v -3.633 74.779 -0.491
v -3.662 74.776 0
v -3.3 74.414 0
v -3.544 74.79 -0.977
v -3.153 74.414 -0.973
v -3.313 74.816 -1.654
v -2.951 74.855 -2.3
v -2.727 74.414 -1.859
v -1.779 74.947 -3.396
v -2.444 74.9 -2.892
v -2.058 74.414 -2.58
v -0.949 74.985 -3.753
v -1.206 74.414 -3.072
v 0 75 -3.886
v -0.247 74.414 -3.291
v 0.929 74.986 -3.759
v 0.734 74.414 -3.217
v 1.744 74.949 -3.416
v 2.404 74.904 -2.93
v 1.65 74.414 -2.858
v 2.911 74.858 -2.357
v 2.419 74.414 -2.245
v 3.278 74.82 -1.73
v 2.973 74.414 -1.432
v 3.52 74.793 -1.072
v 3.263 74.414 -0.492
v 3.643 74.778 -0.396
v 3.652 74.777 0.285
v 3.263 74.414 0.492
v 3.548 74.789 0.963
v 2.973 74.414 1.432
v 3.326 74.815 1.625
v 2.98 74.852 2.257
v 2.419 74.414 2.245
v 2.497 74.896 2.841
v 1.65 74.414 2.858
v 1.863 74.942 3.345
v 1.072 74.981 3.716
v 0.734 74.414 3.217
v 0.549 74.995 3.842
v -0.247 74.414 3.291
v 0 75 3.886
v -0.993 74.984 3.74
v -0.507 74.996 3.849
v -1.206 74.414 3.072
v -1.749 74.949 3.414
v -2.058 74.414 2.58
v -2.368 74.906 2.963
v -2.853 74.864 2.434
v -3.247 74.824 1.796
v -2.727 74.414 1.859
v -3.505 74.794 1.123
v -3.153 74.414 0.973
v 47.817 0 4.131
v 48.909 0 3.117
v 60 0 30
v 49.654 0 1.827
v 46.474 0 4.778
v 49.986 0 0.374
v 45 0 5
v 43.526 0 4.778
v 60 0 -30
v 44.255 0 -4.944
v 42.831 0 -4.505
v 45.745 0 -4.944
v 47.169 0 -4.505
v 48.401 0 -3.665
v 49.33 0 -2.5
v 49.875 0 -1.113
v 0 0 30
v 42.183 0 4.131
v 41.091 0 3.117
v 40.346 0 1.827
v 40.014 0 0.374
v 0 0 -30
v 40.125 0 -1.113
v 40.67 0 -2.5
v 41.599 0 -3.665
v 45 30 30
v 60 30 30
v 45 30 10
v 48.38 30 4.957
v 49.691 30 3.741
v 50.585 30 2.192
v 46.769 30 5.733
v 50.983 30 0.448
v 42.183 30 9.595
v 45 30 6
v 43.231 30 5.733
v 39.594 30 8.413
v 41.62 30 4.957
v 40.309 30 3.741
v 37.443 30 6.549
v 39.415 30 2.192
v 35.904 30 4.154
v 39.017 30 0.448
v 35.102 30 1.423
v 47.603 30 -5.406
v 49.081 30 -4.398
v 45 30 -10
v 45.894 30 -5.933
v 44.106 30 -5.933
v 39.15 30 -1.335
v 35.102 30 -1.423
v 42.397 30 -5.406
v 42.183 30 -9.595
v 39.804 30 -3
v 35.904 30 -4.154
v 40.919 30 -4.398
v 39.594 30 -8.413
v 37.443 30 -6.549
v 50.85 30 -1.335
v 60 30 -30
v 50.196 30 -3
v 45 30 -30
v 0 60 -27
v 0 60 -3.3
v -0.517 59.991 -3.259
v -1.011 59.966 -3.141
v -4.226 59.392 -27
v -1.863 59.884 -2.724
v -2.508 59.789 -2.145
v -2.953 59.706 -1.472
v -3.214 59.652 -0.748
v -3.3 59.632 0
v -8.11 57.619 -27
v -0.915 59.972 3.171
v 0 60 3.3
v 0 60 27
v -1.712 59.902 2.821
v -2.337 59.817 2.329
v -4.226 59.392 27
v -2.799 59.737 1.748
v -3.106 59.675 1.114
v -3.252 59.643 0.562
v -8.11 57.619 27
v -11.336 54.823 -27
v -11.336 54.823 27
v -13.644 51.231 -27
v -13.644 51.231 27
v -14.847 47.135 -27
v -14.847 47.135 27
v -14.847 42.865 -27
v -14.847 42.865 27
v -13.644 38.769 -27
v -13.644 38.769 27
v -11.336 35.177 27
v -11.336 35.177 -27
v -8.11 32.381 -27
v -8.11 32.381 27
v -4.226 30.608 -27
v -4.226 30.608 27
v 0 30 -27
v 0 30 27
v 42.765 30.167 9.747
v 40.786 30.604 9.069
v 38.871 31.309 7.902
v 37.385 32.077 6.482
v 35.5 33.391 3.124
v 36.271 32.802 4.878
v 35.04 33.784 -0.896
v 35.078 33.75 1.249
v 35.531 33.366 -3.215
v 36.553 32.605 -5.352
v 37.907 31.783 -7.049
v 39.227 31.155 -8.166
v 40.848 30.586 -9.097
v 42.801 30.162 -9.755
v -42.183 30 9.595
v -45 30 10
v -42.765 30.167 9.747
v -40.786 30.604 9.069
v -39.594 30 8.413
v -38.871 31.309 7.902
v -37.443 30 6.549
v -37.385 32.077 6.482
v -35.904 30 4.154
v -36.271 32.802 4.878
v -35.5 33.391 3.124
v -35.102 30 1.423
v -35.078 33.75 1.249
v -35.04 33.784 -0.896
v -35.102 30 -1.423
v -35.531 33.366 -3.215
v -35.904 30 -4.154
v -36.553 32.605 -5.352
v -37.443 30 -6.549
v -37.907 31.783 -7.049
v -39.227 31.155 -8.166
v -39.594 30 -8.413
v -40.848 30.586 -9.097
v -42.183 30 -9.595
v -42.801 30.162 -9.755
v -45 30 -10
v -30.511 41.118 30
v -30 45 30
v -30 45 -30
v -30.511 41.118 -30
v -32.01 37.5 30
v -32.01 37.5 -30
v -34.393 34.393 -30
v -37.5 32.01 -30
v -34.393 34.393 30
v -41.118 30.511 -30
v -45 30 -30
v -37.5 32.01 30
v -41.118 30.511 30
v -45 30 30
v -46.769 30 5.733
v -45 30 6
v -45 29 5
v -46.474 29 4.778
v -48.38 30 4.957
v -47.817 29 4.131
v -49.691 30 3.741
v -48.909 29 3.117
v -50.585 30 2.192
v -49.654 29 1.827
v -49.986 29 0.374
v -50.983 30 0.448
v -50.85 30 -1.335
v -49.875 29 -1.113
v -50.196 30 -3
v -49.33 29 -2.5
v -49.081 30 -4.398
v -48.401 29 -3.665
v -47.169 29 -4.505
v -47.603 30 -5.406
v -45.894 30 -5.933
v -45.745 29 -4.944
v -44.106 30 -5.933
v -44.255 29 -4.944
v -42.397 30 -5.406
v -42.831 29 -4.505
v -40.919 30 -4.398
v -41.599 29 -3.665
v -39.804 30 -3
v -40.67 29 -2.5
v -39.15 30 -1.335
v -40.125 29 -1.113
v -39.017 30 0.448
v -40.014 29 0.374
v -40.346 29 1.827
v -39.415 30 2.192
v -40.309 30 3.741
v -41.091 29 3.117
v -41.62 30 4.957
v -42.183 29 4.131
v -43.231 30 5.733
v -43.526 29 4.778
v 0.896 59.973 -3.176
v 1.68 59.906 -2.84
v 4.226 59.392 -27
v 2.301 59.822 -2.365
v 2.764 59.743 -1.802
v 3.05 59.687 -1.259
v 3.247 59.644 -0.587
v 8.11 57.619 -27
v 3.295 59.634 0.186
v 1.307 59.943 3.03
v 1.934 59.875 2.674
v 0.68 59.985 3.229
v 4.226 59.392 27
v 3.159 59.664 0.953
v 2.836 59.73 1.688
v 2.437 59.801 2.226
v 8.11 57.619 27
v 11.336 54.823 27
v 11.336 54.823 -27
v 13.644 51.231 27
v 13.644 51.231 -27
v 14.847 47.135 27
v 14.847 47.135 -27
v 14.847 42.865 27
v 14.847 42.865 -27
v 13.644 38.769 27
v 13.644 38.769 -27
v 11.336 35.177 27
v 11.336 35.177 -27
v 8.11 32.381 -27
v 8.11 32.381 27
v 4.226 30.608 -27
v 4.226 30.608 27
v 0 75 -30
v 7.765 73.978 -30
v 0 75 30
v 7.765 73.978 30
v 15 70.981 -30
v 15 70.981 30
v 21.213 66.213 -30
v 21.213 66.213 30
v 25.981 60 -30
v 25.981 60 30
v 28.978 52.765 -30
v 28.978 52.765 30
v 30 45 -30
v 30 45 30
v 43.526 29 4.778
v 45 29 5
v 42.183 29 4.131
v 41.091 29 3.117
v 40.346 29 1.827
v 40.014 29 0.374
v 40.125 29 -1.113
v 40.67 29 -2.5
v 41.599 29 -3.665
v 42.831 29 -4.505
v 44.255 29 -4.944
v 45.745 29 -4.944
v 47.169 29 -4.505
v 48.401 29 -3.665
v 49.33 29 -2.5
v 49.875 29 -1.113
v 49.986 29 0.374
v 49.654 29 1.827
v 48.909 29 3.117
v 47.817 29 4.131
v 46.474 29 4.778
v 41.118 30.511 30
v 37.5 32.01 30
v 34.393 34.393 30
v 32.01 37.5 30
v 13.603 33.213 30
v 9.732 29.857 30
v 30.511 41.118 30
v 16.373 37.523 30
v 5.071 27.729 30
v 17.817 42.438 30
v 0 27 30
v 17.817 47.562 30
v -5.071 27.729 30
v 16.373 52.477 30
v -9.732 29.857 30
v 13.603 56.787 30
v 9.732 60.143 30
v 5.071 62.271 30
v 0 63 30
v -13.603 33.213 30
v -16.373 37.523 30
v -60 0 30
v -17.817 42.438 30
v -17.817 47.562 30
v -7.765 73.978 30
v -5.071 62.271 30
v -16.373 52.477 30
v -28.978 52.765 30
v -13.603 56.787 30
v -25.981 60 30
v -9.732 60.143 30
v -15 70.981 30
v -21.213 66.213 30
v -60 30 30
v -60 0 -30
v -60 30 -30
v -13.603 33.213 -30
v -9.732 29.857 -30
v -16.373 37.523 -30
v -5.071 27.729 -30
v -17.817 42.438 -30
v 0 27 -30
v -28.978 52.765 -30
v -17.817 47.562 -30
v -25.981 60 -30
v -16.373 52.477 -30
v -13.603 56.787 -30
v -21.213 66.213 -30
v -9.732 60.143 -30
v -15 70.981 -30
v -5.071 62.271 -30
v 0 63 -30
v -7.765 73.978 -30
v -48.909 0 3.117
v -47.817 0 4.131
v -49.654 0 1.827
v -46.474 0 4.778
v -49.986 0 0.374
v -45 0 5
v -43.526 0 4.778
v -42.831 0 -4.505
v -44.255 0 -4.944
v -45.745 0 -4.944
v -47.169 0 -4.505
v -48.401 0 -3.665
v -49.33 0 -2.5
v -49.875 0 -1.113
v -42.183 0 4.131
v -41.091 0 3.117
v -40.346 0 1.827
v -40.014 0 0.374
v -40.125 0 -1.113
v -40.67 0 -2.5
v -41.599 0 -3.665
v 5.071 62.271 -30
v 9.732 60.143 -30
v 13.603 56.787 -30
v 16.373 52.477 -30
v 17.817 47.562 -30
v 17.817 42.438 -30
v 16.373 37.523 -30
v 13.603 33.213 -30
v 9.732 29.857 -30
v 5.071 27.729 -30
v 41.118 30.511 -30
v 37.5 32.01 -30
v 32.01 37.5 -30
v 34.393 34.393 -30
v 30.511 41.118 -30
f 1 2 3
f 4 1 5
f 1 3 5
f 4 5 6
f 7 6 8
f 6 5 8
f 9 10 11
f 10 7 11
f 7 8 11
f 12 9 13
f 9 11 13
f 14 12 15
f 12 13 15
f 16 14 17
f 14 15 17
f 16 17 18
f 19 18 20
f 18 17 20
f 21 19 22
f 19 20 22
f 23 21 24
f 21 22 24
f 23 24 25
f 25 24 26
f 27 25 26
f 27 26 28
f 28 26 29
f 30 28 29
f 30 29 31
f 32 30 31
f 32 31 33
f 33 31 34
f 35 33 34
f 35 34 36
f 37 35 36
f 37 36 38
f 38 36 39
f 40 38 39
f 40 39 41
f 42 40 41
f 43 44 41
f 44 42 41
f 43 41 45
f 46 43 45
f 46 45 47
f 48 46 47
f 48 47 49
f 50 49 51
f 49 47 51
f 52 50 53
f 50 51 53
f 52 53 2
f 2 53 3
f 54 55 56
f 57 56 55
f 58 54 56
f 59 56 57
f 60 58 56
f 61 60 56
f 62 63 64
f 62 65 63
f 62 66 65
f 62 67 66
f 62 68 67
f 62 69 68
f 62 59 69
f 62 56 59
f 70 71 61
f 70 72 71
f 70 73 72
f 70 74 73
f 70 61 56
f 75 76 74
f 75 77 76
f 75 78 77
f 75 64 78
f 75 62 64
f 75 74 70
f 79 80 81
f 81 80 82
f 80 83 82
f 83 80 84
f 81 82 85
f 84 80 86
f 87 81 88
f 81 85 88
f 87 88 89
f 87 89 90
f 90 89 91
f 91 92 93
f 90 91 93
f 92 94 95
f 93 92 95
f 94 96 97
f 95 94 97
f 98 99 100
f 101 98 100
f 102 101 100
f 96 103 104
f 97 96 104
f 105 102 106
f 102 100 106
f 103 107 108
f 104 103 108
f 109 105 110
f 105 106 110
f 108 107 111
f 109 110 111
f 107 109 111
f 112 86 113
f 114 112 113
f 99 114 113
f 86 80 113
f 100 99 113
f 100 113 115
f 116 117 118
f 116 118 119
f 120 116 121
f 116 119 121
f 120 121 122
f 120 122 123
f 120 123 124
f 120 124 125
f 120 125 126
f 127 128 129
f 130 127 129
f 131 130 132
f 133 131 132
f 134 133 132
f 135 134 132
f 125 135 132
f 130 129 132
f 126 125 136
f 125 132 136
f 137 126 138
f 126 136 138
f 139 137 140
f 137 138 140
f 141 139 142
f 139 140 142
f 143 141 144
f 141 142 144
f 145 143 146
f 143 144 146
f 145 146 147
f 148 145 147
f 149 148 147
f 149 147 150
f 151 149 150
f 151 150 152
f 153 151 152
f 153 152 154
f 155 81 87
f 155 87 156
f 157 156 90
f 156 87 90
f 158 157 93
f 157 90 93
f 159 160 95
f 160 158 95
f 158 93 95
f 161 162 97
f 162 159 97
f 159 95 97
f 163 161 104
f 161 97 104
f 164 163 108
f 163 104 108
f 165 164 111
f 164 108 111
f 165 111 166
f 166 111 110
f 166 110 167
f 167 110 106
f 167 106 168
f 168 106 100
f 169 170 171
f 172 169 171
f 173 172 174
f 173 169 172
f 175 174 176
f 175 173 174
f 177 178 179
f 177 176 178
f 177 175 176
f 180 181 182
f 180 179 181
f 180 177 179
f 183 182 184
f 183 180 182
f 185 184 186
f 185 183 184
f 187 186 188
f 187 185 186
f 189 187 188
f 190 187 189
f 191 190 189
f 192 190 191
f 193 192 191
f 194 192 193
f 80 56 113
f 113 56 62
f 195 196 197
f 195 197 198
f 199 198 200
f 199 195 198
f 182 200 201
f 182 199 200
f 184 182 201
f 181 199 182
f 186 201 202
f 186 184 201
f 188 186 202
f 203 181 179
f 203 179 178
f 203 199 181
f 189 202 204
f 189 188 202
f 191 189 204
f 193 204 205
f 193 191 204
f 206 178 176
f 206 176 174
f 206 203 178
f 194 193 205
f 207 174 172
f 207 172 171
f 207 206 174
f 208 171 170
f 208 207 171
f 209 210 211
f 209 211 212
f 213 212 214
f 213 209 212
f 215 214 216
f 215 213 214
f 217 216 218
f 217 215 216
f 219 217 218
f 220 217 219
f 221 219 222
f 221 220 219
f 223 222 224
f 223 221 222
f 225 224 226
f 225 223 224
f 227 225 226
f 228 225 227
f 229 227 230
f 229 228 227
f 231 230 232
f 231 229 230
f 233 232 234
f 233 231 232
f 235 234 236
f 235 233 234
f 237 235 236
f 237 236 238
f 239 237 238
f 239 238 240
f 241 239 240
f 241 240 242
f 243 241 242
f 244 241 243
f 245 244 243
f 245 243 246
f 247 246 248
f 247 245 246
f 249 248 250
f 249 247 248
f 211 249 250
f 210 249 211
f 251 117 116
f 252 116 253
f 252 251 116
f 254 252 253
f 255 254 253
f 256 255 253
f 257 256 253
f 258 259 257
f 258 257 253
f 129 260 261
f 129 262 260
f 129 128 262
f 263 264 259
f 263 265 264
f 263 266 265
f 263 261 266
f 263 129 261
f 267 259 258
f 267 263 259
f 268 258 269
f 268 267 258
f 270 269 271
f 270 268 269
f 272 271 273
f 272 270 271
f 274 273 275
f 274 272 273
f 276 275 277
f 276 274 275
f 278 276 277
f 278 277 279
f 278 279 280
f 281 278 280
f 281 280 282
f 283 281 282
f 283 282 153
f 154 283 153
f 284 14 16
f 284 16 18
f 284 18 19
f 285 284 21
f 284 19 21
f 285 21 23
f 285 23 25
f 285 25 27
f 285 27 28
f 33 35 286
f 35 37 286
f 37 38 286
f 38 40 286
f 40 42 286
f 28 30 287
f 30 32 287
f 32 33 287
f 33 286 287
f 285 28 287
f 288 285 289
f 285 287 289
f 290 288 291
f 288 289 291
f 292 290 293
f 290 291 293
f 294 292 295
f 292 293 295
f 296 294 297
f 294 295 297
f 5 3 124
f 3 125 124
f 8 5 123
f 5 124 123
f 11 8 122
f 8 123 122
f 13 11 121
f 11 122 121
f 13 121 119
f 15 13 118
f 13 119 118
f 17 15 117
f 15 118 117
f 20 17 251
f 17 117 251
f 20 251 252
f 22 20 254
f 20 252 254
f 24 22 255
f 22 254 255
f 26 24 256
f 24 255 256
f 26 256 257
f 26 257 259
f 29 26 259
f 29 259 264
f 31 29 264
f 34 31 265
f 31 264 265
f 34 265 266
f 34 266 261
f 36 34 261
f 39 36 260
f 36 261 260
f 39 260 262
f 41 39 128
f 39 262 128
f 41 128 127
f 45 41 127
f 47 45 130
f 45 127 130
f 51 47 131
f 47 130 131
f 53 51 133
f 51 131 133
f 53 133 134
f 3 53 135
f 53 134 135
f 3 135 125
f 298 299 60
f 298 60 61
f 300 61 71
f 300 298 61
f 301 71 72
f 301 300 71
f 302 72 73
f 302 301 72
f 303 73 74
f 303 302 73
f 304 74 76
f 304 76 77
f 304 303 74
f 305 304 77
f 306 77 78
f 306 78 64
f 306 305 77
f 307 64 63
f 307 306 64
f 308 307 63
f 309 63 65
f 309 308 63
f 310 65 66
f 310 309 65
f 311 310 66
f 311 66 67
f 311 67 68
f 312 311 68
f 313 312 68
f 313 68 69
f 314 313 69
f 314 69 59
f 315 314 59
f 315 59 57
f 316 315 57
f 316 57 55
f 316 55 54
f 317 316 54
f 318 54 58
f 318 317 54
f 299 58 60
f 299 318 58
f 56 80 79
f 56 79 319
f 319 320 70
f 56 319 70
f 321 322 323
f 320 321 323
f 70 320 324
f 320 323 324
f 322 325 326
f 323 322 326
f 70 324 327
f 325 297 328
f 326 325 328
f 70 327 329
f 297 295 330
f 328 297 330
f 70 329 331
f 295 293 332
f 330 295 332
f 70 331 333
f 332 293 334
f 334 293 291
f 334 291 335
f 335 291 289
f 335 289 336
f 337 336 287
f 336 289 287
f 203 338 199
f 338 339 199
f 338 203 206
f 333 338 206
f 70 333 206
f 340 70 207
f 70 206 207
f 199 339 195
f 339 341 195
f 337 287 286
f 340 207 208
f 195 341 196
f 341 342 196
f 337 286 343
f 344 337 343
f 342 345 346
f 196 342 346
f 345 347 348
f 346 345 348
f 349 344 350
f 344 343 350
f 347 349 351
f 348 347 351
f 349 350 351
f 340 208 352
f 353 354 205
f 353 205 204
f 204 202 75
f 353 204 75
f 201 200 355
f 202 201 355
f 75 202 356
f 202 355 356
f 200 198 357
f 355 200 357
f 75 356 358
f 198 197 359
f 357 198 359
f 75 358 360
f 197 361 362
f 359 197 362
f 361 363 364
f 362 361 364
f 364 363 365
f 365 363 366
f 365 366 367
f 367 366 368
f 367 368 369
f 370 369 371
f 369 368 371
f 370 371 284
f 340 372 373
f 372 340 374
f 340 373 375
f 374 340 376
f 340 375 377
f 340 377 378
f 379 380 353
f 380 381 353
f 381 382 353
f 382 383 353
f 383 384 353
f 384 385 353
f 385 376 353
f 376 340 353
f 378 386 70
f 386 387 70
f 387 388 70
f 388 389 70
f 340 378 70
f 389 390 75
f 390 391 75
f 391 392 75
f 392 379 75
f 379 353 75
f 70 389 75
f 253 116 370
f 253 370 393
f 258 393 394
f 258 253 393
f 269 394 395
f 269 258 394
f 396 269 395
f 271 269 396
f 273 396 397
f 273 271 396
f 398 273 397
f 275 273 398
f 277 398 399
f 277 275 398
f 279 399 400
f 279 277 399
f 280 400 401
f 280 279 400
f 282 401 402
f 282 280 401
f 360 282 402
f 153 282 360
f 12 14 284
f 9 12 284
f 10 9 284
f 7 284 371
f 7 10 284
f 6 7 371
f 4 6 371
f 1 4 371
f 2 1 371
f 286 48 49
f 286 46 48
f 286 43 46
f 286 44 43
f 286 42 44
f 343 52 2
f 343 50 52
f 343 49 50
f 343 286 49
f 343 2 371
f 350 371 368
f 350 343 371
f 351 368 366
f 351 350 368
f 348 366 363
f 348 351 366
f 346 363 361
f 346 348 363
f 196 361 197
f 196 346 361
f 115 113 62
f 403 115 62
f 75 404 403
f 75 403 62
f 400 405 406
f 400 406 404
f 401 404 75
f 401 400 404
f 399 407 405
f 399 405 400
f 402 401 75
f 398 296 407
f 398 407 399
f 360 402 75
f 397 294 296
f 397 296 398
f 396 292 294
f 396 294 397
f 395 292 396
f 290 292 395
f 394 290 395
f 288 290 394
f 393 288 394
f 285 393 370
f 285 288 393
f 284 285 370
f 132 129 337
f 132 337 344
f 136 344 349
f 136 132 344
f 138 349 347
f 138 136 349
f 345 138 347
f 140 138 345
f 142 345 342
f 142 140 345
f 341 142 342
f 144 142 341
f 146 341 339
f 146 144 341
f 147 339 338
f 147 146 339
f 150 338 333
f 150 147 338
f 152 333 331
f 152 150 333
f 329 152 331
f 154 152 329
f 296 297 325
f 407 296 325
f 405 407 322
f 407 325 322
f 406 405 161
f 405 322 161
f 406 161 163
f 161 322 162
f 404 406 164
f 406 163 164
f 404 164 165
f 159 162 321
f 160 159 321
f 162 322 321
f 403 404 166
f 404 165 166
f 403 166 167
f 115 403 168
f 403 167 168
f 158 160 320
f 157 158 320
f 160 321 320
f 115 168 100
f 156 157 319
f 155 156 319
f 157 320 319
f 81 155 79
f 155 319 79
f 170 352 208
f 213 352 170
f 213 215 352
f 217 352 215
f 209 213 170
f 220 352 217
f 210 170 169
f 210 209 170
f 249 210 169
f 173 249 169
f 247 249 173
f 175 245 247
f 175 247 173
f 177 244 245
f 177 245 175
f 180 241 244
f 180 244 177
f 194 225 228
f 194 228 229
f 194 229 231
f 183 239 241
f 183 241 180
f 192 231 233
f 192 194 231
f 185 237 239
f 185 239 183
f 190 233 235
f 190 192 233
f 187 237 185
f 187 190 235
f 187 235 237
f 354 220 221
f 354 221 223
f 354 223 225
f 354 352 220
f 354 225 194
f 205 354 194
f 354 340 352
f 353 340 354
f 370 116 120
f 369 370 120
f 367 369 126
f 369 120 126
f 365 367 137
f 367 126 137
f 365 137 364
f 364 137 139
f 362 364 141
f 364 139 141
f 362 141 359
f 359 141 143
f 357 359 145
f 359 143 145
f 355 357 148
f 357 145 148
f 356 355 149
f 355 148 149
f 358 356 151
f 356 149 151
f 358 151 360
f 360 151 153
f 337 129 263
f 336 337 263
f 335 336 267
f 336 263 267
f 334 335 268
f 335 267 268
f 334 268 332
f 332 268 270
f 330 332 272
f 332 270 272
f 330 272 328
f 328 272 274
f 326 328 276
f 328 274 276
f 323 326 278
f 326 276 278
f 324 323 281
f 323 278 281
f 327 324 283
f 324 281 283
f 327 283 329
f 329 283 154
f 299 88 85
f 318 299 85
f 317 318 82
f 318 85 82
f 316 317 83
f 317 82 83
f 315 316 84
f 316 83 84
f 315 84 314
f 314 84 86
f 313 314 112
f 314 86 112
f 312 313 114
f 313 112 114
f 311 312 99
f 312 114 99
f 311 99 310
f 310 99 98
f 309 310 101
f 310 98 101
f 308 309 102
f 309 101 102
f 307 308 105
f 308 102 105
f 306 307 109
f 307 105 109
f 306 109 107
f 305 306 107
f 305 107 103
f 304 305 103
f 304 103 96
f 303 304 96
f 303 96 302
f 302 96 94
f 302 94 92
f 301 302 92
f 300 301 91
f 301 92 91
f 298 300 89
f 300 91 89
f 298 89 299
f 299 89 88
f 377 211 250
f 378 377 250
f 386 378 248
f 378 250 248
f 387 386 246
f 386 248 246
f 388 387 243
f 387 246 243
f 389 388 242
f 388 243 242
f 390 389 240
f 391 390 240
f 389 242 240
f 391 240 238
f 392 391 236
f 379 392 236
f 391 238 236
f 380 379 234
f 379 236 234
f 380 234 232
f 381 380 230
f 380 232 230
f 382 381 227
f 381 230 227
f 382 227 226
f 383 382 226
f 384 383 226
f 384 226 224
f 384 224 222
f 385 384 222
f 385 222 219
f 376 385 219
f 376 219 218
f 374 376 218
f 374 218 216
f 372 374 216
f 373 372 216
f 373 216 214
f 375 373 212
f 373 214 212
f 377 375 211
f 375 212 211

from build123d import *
from build123d.topology import SkipClean

# Parameters (mm, degrees)
SKETCH1_W                      = 120
SKETCH1_H                      = 60
BOSS_EXTRUDE1_DEPTH            = 30
SKETCH2_R                      = 30
BOSS_EXTRUDE2_DEPTH            = 60
FILLET1_R                      = 15
SKETCH3_R                      = 5
CUT_EXTRUDE2_DEPTH             = 81.777472107
SKETCH4_R                      = 10
CUT_EXTRUDE3_DEPTH             = 22
CHAMFER1_SIZE                  = 1
SKETCH5_R                      = 15
CUT_EXTRUDE4_DEPTH             = 114.247516582
CHAMFER3_SIZE                  = 3
G1_16_TAPPED_HOLE2_D           = 6.6
G1_16_TAPPED_HOLE2_DEPTH       = 29.999
G1_16_TAPPED_HOLE2_CSINK_D     = 7.773
G1_16_TAPPED_HOLE2_CSINK_ANGLE = 90
G1_16_TAPPED_HOLE2_TIP         = 1.982840043


# Read off the part's stored shape, not the designer's step: Mirror1
with BuildPart() as part:
    # Sketch1 → Boss-Extrude1 (new body)
    with BuildSketch(Plane(origin=(0, 0, 0), x_dir=(1, 0, 0), z_dir=(0, 1, 0))):
        Rectangle(SKETCH1_W, SKETCH1_H)
    extrude(amount=BOSS_EXTRUDE1_DEPTH)

    # Sketch2 → Boss-Extrude2 (add)
    with BuildSketch(Plane.XY.offset(30)):
        with Locations((0, 45)):
            Circle(SKETCH2_R)
    extrude(amount=-BOSS_EXTRUDE2_DEPTH)

    # Fillet1
    fillet1_edges = [part.edges().sort_by_distance(p)[0] for p in [
        (-25.980762114, 30, 0),
    ]]
    fillet(fillet1_edges, radius=FILLET1_R)

    # Sketch3 → Cut-Extrude2 (cut, symmetric)
    with BuildSketch(Plane(origin=(0, 30, 0), x_dir=(1, 0, 0), z_dir=(0, 1, 0))):
        with Locations(Location((-45, 0, 0), (0, 0, 270))):
            Circle(SKETCH3_R)
    extrude(amount=CUT_EXTRUDE2_DEPTH, both=True, mode=Mode.SUBTRACT)

    # Sketch4 → Cut-Extrude3 (cut)
    with BuildSketch(Plane(origin=(0, 30, 0), x_dir=(1, 0, 0), z_dir=(0, 1, 0))):
        with Locations((-45, 0)):
            Circle(SKETCH4_R)
    extrude(amount=CUT_EXTRUDE3_DEPTH, mode=Mode.SUBTRACT)

    # Chamfer1
    chamfer1_edges = [part.edges().sort_by_distance(p)[0] for p in [
        (-45, 30, -5),
    ]]
    chamfer(chamfer1_edges, length=CHAMFER1_SIZE)

    # Sketch5 → Cut-Extrude4 (cut, through all)
    with BuildSketch(Plane.XY.offset(30)):
        with Locations((0, 45)):
            Circle(SKETCH5_R)
    extrude(amount=-CUT_EXTRUDE4_DEPTH, mode=Mode.SUBTRACT)

    # Chamfer3
    chamfer3_edges = [part.edges().sort_by_distance(p)[0] for p in [
        (-15, 45, -30),
        (-15, 45, 30),
    ]]
    chamfer(chamfer3_edges, length=CHAMFER3_SIZE)

    # Mirror1
    split(bisect_by=Plane(origin=(0, 0, 0), x_dir=(0, 0, 1), z_dir=(1, 0, 0)), keep=Keep.BOTTOM)

    # Mirror1 2: part across plane


with BuildPart() as part_1:
    with SkipClean():  # the faces are left unmerged after this step: merging them gives an invalid solid
        add(part.part)
        add(part.part.mirror(Plane(origin=(0, 0, 0), x_dir=(0, 0, 1), z_dir=(1, 0, 0))))

    # G1/16 Tapped Hole2
    with Locations(Plane(origin=(0, 75, 0), x_dir=(1, 0, 0), z_dir=(0, 1, 0))):
        with Locations((0, 0)):
            CounterSinkHole(G1_16_TAPPED_HOLE2_D / 2, G1_16_TAPPED_HOLE2_CSINK_D / 2, depth=G1_16_TAPPED_HOLE2_DEPTH, counter_sink_angle=G1_16_TAPPED_HOLE2_CSINK_ANGLE)
            with Locations((0, 0, -(G1_16_TAPPED_HOLE2_DEPTH + G1_16_TAPPED_HOLE2_TIP / 2))):  # 118° drill point
                Cone(0, G1_16_TAPPED_HOLE2_D / 2, G1_16_TAPPED_HOLE2_TIP, mode=Mode.SUBTRACT)


solid = part_1.part
